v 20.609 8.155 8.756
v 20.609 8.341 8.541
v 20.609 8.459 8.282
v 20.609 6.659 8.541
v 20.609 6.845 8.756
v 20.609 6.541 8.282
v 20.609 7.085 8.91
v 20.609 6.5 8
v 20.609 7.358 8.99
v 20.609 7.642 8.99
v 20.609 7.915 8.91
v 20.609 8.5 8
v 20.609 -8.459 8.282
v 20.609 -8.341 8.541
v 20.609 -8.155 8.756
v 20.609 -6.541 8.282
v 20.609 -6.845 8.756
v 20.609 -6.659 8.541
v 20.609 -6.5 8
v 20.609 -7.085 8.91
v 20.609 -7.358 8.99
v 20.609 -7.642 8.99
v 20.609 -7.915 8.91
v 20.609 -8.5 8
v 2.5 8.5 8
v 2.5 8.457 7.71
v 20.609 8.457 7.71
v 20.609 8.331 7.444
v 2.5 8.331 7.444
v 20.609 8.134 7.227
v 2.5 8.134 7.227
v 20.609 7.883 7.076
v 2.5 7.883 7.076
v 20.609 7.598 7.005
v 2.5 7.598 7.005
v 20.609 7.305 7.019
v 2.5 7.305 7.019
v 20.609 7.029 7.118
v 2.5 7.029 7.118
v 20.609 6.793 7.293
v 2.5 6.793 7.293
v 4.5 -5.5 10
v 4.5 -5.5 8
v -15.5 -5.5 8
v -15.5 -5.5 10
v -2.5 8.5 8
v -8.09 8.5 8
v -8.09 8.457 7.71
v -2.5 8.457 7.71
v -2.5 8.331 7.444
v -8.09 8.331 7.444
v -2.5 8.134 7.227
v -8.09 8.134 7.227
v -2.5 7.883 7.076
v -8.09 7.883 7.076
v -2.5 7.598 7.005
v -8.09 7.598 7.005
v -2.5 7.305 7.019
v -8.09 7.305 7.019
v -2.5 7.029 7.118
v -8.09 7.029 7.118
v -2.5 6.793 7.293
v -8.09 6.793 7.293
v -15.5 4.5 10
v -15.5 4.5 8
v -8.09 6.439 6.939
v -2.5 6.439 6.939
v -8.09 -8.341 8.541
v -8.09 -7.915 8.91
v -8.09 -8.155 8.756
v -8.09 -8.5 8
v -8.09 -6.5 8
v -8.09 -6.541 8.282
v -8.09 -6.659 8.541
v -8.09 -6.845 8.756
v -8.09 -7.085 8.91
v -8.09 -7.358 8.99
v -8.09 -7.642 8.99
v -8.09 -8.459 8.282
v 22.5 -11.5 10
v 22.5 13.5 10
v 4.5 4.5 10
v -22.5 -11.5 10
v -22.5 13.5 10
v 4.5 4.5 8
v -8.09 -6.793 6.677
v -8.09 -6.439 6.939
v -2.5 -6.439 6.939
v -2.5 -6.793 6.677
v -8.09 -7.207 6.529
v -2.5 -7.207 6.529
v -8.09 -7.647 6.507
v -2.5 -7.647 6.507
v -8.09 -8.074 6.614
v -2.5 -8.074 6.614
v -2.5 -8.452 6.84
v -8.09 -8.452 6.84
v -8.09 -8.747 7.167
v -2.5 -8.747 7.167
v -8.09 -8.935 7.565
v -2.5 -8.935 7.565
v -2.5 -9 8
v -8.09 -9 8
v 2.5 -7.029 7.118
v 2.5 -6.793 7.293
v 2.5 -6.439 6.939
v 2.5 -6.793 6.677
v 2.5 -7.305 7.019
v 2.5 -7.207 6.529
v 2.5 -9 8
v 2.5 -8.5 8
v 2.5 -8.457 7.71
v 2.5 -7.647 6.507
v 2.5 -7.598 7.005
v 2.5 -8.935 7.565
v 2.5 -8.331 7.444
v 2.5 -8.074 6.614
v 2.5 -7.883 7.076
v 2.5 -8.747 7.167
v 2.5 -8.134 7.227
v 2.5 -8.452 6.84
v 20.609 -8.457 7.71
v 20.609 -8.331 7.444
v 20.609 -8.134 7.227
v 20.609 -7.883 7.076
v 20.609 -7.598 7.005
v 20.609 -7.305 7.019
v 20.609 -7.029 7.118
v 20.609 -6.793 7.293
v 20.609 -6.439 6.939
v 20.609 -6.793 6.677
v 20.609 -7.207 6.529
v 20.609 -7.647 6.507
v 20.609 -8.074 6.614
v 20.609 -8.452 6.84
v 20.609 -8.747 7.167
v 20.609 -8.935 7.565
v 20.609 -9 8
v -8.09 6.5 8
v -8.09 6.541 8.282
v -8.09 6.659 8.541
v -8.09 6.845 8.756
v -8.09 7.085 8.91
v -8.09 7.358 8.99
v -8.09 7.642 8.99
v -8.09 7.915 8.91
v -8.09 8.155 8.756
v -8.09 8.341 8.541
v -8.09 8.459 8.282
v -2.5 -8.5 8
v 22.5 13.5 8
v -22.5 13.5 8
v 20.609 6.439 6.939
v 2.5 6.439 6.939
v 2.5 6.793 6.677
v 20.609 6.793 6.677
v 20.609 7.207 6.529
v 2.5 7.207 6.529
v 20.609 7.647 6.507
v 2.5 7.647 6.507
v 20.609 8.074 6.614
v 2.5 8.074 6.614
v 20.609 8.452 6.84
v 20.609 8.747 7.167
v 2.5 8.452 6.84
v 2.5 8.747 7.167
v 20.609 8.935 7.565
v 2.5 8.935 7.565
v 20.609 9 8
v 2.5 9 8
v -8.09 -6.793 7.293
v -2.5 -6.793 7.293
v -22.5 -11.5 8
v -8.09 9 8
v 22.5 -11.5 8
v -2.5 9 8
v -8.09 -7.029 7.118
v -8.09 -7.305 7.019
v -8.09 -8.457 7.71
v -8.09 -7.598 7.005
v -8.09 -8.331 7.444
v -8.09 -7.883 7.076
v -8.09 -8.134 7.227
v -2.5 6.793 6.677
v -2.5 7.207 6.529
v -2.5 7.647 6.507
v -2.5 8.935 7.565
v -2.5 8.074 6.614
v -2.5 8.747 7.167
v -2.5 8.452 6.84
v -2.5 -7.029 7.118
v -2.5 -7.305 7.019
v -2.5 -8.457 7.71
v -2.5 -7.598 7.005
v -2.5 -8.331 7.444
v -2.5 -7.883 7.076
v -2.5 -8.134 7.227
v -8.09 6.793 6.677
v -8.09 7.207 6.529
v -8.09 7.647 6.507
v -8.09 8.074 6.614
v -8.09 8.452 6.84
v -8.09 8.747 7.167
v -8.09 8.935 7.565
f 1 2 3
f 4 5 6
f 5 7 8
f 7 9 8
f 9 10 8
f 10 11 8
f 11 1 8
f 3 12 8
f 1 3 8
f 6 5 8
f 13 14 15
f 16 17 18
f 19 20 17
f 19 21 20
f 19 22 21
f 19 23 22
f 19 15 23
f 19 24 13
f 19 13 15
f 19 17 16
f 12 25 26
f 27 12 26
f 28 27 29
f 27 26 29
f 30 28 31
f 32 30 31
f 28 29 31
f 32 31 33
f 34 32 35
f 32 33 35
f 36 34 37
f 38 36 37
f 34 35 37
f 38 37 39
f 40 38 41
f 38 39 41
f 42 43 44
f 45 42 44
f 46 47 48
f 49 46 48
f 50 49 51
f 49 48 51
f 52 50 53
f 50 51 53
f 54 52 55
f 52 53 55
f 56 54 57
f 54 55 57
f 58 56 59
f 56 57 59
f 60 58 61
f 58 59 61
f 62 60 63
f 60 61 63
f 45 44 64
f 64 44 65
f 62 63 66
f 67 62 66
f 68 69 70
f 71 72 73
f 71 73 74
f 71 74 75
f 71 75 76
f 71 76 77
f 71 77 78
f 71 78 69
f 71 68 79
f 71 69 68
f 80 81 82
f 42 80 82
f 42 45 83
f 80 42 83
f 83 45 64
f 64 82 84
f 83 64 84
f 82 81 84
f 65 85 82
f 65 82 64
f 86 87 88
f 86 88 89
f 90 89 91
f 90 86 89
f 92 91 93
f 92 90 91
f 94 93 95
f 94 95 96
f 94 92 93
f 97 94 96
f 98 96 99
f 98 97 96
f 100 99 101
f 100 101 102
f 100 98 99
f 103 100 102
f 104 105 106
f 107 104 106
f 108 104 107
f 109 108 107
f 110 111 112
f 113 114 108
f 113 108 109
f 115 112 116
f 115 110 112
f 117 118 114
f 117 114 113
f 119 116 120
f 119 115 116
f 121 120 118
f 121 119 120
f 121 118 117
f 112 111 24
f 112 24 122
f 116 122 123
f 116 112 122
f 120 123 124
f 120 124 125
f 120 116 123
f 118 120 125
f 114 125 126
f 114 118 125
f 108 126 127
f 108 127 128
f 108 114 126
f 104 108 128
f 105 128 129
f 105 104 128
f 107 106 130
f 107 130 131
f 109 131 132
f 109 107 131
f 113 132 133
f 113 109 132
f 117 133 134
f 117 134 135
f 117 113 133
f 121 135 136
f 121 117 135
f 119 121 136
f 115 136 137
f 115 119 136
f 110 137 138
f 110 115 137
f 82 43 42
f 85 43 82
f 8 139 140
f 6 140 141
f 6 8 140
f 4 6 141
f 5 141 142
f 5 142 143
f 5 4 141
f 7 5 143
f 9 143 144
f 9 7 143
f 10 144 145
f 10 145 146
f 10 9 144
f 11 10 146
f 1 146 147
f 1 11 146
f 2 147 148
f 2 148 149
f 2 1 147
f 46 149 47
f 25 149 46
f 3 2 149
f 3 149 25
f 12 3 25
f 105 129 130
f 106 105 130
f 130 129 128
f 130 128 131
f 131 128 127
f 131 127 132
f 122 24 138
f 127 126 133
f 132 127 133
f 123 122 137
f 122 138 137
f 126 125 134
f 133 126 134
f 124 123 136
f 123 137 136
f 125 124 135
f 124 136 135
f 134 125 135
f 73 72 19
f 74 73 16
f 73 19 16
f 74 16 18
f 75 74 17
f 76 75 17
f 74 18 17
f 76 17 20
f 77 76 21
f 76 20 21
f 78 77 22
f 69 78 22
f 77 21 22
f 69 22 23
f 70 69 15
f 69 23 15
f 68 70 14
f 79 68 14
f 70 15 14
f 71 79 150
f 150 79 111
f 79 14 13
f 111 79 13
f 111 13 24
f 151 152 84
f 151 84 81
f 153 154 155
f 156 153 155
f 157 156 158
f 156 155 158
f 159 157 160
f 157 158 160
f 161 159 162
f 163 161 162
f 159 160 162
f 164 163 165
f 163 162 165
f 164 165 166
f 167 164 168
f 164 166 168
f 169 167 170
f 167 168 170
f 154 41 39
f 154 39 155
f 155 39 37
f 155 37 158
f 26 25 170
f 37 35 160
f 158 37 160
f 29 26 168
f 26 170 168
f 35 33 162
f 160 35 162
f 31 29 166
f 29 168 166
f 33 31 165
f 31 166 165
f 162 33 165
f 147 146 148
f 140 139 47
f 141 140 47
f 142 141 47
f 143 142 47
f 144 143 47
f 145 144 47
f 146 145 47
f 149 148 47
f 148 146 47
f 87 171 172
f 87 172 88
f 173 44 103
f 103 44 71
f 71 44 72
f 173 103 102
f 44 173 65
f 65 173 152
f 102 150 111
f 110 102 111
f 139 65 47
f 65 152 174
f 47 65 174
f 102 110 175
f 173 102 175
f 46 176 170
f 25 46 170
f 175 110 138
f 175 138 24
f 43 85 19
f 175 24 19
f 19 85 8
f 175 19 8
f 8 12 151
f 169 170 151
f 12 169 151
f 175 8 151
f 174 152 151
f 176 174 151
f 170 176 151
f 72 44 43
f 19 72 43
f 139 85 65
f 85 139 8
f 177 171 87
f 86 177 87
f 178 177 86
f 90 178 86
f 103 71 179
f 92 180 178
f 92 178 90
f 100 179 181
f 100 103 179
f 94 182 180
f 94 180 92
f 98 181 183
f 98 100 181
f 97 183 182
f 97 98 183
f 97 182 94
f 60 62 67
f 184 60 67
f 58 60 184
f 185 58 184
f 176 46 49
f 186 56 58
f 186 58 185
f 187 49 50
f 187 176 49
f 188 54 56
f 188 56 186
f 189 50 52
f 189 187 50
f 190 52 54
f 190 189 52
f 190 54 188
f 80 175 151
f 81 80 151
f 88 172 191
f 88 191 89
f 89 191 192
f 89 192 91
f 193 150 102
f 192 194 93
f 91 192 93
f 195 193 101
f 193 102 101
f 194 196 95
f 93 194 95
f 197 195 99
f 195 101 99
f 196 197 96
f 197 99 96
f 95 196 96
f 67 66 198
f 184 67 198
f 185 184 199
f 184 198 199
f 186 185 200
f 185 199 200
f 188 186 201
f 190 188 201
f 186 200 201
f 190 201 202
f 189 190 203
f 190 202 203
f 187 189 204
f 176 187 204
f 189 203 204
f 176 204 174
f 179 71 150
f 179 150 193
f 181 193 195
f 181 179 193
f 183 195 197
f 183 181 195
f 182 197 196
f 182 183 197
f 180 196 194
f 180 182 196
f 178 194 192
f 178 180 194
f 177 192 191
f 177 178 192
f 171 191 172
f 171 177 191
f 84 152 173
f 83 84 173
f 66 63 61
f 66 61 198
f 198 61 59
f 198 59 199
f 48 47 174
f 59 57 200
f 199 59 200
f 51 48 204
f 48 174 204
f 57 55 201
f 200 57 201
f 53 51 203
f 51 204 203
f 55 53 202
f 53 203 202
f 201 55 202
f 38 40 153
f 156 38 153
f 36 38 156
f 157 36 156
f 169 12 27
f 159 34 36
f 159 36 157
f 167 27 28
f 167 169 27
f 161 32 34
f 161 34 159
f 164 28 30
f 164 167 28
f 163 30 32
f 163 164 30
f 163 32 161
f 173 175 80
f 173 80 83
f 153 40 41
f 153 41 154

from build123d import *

# Parameters (mm, degrees)
Y_KSEKLIK_EKSTR_ZYON1_DEPTH = 10
BO_ALTMA1_T                 = -2
IZIM2_W                     = 45
IZIM2_H                     = 25
KES_EKSTR_ZYON1_DEPTH       = 8
IZIM3_W                     = 20
IZIM3_H                     = 10
KES_EKSTR_ZYON2_DEPTH       = 6
Y_KSEKLIK_EKSTR_ZYON2_DEPTH = 28.698952
KES_EKSTR_ZYON3_DEPTH       = 2.5


with BuildPart() as part:
    # Çizim1 → Yükseklik-Ekstrüzyon1 (new body)
    with BuildSketch(Plane.XY):
        Polygon((22.5, 11.5), (22.5, -11.5), (-22.5, -11.5), (-22.5, 11.5), (-22.5, 13.5), (22.5, 13.5), align=None)
    extrude(amount=Y_KSEKLIK_EKSTR_ZYON1_DEPTH)

    # İç Boşaltma1
    bo_altma1_openings = [part.faces().sort_by_distance(p)[0] for p in [
        (0, -11.5, 5),
        (-22.5, 1, 5),
        (22.5, 1, 5),
    ]]
    offset(amount=BO_ALTMA1_T, openings=bo_altma1_openings, kind=Kind.INTERSECTION)

    # Çizim2 → Kes-Ekstrüzyon1 (cut)
    with BuildSketch(Plane.XY):
        with Locations((0, 1)):
            Rectangle(IZIM2_W, IZIM2_H)
    extrude(amount=KES_EKSTR_ZYON1_DEPTH, mode=Mode.SUBTRACT)

    # Çizim3 → Kes-Ekstrüzyon2 (cut)
    with BuildSketch(Plane(origin=(0, 0, 8), x_dir=(-1, 0, 0), z_dir=(0, 0, -1))):
        with Locations((5.5, -0.5)):
            Rectangle(IZIM3_W, IZIM3_H)
    extrude(amount=-KES_EKSTR_ZYON2_DEPTH, mode=Mode.SUBTRACT)

    # Çizim4 → Kes-Döndür1 (revolve, cut)
    with BuildSketch(Plane(origin=(0, 0, 8), x_dir=(-1, 0, 0), z_dir=(0, 0, -1))):
        Polygon((-20.60881654, 7.5), (-20.60881654, 8.5), (-8.5, 8.5), (8.090135665, 8.5), (8.090135665, 7.5), align=None)
    kes_d_nd_r1 = revolve(axis=Axis((20.60881654, 7.5, 8), (-1, 0, 0)), mode=Mode.SUBTRACT)

    # Çizim6 → Yükseklik-Ekstrüzyon2 (add)
    with BuildSketch(Plane(origin=(-8.090135665, 0, 0), x_dir=(0, 0, -1), z_dir=(1, 0, 0))):
        with BuildLine():
            Line((-8, 9), (-8, 8.5))
            ThreePointArc((-8, 8.5), (-7.076120467, 7.882683432), (-7.292893219, 6.792893219))
            Line((-7.292893219, 6.792893219), (-6.939339828, 6.439339828))
            ThreePointArc((-6.939339828, 6.439339828), (-6.614180701, 8.074025149), (-8, 9))
        make_face()
    y_kseklik_ekstr_zyon2 = extrude(amount=Y_KSEKLIK_EKSTR_ZYON2_DEPTH)

    # Çizim8 → Kes-Ekstrüzyon3 (cut, symmetric)
    with BuildSketch(Plane(origin=(0, 0, 0), x_dir=(0, 0, -1), z_dir=(1, 0, 0))):
        with BuildLine():
            Line((-7.292893219, 6.792893219), (-6.939339828, 6.439339828))
            ThreePointArc((-6.939339828, 6.439339828), (-6.614180701, 8.074025149), (-8, 9))
            Line((-8, 9), (-8, 8.5))
            ThreePointArc((-8, 8.5), (-7.076120467, 7.882683432), (-7.292893219, 6.792893219))
        make_face()
    kes_ekstr_zyon3 = extrude(amount=KES_EKSTR_ZYON3_DEPTH, both=True, mode=Mode.SUBTRACT)

    # Aynalama1: Kes-Döndür1, Yükseklik-Ekstrüzyon2, Kes-Ekstrüzyon3 across plane
    add(kes_d_nd_r1.mirror(Plane.ZX), mode=Mode.SUBTRACT)
    add(y_kseklik_ekstr_zyon2.mirror(Plane.ZX))
    add(kes_ekstr_zyon3.mirror(Plane.ZX), mode=Mode.SUBTRACT)


solid = part.part
